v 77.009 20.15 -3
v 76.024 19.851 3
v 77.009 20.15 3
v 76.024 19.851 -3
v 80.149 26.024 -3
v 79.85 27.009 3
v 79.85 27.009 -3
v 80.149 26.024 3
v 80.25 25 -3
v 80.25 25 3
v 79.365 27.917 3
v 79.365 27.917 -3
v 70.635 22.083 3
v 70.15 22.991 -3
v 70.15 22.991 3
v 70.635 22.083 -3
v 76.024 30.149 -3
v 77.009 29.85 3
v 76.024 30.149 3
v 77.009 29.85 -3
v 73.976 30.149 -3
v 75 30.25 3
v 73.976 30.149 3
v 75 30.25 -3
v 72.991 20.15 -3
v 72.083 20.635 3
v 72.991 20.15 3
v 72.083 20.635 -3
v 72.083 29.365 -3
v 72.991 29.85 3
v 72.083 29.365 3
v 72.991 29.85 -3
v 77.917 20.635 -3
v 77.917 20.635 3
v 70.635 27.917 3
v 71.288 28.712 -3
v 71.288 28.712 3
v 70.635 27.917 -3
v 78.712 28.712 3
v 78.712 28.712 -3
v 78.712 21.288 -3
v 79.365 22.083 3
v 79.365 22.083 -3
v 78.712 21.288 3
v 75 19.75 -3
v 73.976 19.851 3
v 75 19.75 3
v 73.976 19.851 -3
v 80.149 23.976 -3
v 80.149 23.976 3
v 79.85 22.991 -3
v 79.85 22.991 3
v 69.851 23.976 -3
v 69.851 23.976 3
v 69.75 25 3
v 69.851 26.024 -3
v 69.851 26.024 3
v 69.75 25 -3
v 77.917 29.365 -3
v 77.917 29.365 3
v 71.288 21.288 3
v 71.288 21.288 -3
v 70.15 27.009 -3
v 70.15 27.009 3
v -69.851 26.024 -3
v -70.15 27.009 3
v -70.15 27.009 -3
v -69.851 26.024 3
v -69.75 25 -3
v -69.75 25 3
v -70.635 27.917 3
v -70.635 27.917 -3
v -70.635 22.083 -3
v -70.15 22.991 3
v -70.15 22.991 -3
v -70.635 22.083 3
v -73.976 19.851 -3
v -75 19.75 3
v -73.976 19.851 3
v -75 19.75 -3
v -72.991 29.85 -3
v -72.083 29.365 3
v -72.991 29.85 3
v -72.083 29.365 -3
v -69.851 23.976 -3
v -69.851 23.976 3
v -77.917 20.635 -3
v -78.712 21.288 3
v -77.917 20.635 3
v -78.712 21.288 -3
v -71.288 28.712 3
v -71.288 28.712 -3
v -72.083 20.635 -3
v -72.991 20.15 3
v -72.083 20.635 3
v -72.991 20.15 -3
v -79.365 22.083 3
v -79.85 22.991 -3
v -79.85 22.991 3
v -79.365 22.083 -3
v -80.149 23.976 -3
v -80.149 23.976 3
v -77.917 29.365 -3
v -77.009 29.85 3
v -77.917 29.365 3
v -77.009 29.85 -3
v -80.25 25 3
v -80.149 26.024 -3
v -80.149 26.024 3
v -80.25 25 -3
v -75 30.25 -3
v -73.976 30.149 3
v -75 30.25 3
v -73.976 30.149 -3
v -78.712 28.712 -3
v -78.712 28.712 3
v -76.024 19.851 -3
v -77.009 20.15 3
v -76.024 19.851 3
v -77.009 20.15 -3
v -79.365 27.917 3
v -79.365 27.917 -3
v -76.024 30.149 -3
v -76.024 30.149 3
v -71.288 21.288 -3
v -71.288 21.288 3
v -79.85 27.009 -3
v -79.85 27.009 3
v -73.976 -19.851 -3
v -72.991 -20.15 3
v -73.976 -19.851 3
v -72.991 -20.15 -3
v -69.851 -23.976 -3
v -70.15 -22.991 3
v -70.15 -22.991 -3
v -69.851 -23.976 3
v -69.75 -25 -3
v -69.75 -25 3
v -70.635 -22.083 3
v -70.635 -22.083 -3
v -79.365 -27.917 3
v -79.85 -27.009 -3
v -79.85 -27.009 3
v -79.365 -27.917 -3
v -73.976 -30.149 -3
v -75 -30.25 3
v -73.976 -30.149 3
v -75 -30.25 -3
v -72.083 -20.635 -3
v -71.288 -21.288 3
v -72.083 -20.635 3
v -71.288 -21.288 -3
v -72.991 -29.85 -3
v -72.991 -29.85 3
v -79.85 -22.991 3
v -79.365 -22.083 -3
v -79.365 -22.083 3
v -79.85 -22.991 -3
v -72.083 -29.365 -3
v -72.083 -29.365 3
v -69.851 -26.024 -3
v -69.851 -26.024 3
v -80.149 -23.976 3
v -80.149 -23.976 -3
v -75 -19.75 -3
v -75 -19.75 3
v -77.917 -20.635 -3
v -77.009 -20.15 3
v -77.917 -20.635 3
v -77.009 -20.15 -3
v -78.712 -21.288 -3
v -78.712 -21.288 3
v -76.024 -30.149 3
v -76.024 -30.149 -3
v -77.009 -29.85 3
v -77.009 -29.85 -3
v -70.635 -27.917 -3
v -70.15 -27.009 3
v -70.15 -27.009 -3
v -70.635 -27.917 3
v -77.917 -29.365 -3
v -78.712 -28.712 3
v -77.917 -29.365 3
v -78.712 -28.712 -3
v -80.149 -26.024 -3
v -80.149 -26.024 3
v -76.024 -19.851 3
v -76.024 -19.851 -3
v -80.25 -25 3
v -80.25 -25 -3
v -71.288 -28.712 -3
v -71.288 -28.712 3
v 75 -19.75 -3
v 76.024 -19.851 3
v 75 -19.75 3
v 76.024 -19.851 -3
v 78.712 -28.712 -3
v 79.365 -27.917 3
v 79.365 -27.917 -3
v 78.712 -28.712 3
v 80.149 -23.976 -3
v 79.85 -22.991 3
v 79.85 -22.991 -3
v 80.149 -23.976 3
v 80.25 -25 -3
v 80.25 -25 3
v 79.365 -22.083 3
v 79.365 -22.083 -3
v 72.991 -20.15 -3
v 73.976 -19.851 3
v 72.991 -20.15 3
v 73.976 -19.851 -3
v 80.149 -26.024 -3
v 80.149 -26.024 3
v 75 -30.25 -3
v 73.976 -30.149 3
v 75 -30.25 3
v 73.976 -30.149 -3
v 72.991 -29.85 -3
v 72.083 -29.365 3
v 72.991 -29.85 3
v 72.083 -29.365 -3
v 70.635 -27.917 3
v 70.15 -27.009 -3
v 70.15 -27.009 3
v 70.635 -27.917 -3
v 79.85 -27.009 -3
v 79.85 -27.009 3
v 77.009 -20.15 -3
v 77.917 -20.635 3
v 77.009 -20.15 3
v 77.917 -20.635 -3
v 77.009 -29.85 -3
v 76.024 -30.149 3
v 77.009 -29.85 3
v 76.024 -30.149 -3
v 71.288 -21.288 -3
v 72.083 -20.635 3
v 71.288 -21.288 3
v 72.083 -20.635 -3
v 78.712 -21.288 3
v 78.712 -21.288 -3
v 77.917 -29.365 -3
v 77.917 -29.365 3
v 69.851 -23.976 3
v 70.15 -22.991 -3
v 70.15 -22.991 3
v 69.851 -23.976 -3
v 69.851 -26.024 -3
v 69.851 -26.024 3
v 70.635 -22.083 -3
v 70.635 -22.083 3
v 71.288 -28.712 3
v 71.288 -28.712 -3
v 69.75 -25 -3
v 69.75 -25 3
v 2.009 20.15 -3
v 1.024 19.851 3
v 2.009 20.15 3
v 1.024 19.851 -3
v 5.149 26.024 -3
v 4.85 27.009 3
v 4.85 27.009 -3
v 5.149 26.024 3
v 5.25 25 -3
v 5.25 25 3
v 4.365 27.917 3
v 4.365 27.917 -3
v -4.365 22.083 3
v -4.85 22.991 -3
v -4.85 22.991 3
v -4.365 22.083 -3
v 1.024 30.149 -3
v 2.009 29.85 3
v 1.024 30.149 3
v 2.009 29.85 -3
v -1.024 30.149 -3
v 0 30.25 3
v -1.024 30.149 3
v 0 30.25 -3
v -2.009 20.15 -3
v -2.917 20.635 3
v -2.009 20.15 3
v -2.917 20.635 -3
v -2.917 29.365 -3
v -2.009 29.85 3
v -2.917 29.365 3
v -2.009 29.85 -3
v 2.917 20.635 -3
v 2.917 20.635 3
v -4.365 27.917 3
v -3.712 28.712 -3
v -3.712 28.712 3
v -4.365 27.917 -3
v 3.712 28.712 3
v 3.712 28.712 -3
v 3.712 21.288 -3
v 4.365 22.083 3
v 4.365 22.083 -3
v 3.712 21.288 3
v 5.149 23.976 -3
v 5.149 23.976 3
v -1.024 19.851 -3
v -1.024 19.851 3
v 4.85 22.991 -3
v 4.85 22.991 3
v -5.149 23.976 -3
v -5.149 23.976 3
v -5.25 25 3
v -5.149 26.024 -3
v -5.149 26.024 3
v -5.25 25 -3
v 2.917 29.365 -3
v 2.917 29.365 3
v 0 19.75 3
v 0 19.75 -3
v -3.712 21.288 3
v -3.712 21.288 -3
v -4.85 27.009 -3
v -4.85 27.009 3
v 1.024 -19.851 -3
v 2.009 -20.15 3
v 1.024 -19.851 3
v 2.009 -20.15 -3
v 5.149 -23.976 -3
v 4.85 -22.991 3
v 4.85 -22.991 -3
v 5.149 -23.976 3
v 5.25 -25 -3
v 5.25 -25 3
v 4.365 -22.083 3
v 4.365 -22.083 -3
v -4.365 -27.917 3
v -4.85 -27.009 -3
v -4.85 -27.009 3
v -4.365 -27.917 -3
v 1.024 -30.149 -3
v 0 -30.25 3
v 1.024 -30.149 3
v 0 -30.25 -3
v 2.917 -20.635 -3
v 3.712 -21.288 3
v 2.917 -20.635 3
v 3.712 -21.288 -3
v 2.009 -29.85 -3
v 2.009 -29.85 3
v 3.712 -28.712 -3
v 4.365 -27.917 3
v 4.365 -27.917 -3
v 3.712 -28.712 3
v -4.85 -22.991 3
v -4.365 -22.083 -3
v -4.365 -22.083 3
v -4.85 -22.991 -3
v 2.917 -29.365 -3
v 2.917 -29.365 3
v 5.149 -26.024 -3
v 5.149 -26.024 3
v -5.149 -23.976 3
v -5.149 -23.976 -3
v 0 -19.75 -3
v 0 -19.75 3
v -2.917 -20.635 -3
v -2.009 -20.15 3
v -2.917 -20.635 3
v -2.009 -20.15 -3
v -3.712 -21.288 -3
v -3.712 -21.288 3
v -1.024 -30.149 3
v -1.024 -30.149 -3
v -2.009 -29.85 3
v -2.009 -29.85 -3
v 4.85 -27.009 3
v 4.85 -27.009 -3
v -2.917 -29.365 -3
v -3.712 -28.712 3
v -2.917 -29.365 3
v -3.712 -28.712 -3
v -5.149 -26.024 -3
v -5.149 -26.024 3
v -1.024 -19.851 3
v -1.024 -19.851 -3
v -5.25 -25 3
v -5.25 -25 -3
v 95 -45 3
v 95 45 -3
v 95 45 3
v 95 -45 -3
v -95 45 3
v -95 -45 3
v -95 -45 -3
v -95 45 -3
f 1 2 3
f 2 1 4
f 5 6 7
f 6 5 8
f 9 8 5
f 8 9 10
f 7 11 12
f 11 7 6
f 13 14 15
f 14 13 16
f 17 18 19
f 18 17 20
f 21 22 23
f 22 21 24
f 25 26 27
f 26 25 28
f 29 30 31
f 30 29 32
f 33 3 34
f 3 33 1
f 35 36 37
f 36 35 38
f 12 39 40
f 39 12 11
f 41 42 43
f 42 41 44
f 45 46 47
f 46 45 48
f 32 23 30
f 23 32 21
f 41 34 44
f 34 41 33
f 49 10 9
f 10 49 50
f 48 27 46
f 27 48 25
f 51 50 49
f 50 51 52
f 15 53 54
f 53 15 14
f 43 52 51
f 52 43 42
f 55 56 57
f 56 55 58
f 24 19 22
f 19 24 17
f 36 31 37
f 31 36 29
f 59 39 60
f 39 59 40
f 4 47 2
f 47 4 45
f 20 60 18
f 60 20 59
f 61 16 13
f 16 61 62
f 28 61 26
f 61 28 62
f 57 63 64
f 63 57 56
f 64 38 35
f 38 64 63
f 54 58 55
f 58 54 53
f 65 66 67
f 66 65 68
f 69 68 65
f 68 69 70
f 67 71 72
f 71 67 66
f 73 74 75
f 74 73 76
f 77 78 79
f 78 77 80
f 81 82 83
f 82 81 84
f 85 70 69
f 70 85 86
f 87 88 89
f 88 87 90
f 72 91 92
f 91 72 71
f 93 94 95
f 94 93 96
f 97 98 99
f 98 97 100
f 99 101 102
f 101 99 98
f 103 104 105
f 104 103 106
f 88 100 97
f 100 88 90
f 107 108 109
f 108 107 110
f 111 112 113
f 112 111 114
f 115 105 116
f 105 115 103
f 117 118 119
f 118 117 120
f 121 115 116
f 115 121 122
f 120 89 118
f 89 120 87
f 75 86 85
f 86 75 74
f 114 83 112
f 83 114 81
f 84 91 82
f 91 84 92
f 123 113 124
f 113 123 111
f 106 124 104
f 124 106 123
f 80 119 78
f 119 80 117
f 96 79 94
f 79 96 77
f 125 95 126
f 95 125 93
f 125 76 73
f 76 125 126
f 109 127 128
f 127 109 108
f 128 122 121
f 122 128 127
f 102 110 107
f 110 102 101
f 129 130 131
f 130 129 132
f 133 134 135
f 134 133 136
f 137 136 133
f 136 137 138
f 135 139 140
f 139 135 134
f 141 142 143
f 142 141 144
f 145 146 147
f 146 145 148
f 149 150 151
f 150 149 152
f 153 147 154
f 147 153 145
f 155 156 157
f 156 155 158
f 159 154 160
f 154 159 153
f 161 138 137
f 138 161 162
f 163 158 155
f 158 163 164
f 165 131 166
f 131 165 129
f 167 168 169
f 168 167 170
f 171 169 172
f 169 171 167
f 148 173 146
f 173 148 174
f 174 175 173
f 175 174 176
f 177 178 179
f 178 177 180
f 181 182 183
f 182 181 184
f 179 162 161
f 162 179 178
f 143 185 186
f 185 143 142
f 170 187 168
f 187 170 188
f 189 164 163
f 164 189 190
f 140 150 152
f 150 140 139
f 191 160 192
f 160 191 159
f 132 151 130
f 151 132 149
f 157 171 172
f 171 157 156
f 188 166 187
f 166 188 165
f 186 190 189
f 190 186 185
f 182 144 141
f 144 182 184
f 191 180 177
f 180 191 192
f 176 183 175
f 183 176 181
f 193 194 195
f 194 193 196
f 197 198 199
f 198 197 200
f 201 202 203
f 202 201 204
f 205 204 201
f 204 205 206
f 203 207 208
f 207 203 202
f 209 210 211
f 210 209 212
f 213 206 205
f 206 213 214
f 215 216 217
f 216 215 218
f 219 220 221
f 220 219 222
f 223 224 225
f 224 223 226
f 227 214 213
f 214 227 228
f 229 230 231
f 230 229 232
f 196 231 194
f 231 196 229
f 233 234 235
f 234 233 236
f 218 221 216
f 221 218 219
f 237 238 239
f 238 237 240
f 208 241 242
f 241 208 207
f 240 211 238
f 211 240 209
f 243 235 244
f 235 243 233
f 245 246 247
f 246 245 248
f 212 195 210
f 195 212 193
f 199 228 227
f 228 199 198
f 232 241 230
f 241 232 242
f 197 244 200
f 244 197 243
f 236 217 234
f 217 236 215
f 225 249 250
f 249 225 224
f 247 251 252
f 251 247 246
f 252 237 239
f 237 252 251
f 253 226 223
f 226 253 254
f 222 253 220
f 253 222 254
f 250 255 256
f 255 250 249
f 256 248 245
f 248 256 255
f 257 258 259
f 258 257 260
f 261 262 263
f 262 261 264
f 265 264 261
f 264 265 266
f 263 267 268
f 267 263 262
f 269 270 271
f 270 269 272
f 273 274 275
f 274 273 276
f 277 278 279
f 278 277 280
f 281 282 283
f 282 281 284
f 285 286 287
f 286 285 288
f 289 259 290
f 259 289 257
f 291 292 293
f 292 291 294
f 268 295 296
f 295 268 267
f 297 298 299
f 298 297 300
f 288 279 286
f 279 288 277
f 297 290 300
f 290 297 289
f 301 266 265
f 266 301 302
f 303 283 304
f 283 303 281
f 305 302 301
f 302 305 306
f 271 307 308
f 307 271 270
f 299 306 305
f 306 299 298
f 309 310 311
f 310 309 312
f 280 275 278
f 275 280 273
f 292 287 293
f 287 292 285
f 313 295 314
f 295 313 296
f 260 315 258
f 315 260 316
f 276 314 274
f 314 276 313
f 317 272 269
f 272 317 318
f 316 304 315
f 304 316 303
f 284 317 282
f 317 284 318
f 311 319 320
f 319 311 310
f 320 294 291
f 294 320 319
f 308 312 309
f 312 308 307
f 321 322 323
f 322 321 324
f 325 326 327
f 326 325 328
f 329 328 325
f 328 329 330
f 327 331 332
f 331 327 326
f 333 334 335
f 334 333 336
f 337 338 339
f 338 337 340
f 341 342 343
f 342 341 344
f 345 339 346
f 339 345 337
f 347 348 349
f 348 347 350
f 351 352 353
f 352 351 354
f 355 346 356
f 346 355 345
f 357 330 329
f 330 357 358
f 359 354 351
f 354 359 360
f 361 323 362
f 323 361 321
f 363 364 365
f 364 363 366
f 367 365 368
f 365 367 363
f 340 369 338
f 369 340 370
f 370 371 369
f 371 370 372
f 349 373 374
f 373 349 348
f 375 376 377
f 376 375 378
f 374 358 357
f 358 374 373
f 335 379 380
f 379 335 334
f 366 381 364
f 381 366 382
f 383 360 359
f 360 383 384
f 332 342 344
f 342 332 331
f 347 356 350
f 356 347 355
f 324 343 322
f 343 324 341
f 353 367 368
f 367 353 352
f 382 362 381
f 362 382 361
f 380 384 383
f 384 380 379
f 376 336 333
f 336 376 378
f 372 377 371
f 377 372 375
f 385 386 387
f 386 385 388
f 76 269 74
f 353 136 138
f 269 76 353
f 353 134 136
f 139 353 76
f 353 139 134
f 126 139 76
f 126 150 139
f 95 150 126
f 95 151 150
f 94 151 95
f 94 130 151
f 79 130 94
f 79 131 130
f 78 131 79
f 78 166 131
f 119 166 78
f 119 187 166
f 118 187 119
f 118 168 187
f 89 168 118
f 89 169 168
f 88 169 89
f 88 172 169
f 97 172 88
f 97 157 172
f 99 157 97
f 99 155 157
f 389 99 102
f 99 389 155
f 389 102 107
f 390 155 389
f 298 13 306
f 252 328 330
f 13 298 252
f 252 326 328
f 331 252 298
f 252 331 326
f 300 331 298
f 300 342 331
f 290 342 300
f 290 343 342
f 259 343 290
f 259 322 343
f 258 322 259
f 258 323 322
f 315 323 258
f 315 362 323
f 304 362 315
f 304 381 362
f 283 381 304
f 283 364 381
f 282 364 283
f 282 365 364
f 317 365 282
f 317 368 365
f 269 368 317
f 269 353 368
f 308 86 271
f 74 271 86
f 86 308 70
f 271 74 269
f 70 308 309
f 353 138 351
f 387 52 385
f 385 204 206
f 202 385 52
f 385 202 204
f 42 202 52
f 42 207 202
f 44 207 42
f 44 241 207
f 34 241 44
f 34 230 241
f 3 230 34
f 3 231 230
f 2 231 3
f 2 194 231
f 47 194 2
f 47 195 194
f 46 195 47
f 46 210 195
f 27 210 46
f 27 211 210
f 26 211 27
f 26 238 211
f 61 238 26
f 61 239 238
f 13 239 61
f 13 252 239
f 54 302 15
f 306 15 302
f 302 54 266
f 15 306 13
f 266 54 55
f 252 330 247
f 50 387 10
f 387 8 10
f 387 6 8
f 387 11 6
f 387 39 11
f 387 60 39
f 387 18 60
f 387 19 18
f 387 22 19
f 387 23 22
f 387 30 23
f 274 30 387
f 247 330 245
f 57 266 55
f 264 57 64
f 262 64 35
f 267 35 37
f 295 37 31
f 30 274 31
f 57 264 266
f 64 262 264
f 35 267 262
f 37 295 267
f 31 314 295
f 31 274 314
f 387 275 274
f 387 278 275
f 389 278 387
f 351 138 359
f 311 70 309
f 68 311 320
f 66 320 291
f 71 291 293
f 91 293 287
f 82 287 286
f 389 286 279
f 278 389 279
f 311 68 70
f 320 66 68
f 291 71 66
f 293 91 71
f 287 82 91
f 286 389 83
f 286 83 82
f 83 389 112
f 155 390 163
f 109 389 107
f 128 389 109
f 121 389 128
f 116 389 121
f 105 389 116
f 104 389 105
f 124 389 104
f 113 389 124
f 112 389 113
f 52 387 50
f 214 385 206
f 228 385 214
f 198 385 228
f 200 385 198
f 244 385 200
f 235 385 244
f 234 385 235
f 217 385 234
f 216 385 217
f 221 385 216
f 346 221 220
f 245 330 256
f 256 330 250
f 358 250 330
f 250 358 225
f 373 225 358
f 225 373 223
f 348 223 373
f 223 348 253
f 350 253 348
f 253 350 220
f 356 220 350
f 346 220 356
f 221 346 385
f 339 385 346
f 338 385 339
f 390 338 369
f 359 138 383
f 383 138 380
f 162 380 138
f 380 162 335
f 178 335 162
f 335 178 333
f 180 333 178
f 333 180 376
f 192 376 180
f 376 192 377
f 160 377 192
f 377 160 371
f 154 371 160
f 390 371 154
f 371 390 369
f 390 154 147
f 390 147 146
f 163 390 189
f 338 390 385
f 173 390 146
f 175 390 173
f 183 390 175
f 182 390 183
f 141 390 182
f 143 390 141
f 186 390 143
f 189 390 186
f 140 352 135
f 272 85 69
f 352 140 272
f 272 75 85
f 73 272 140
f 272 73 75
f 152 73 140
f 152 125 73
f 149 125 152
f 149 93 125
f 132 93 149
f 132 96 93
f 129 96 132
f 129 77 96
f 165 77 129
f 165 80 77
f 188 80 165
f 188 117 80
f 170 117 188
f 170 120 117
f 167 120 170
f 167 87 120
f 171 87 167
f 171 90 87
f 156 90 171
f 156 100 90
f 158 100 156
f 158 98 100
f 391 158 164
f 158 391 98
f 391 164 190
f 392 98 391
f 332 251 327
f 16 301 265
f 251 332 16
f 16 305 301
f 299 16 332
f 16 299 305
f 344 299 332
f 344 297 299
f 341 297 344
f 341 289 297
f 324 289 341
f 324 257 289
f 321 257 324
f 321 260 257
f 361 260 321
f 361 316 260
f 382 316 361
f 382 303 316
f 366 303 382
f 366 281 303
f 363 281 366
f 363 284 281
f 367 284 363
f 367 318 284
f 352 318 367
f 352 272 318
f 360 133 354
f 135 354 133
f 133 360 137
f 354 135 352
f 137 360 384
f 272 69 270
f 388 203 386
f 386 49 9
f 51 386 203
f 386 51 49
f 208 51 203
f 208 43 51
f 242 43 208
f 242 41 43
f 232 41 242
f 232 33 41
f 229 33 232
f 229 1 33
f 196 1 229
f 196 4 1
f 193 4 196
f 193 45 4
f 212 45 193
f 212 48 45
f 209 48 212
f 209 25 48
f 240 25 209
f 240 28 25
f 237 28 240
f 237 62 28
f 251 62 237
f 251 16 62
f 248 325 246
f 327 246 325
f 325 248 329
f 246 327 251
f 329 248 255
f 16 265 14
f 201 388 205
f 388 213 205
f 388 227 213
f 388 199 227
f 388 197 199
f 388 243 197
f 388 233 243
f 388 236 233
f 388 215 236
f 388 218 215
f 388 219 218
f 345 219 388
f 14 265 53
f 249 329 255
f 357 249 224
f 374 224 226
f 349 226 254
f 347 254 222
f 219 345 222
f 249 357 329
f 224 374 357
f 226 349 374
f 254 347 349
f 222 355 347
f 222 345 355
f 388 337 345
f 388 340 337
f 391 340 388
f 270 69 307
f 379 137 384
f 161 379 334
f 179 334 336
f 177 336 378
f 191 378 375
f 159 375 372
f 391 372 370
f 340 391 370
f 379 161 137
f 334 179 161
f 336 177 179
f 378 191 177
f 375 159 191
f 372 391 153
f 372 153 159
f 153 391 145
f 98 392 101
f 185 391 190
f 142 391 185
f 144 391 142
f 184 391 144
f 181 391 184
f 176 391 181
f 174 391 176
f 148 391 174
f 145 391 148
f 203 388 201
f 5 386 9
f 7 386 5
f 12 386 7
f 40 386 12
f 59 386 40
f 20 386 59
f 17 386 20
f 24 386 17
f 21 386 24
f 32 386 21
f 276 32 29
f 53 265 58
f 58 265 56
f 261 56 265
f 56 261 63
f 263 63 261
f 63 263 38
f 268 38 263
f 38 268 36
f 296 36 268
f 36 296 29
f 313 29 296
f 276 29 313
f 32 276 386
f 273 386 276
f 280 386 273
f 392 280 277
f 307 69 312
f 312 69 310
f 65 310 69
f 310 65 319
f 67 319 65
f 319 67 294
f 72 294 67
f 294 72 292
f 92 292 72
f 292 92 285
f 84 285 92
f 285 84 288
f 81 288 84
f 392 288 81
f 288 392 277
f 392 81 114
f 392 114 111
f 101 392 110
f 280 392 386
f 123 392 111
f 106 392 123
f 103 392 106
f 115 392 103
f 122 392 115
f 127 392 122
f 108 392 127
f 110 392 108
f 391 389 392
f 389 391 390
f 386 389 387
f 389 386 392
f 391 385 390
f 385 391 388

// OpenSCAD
$fn = 32;

// ----------------------------------------------------------------------
// Corner plate 190 x 90 x 6
// 6 holes, centres taken from the edge offset
// ----------------------------------------------------------------------

// --- parameters (mm) ---
plate = [190, 90, 6];  // overall size (x, y, z)
holes = 6;             // number of holes the drawing asks for
hole_d = 10.5;         // hole diameter
edge = 20;             // hole centre offset from the plate edge

// --- derived feature positions (mm) ---
corner_x = plate[0] / 2 - edge;  // = 75   corner hole X
corner_y = plate[1] / 2 - edge;  // = 25   corner hole Y
feature_centers = [
  [corner_x, corner_y],
  [-corner_x, corner_y],
  [-corner_x, -corner_y],
  [corner_x, -corner_y],
  [0, corner_y],
  [0, -corner_y]
];   // hole centres the loop below drills

// plate outline, every hole drilled through with the same cutters
difference() {
  cube(plate, center = true);
  for (centre = feature_centers)
    translate([centre[0], centre[1], 0])
      cylinder(d = hole_d, h = plate[2] + 2, center = true);
}
